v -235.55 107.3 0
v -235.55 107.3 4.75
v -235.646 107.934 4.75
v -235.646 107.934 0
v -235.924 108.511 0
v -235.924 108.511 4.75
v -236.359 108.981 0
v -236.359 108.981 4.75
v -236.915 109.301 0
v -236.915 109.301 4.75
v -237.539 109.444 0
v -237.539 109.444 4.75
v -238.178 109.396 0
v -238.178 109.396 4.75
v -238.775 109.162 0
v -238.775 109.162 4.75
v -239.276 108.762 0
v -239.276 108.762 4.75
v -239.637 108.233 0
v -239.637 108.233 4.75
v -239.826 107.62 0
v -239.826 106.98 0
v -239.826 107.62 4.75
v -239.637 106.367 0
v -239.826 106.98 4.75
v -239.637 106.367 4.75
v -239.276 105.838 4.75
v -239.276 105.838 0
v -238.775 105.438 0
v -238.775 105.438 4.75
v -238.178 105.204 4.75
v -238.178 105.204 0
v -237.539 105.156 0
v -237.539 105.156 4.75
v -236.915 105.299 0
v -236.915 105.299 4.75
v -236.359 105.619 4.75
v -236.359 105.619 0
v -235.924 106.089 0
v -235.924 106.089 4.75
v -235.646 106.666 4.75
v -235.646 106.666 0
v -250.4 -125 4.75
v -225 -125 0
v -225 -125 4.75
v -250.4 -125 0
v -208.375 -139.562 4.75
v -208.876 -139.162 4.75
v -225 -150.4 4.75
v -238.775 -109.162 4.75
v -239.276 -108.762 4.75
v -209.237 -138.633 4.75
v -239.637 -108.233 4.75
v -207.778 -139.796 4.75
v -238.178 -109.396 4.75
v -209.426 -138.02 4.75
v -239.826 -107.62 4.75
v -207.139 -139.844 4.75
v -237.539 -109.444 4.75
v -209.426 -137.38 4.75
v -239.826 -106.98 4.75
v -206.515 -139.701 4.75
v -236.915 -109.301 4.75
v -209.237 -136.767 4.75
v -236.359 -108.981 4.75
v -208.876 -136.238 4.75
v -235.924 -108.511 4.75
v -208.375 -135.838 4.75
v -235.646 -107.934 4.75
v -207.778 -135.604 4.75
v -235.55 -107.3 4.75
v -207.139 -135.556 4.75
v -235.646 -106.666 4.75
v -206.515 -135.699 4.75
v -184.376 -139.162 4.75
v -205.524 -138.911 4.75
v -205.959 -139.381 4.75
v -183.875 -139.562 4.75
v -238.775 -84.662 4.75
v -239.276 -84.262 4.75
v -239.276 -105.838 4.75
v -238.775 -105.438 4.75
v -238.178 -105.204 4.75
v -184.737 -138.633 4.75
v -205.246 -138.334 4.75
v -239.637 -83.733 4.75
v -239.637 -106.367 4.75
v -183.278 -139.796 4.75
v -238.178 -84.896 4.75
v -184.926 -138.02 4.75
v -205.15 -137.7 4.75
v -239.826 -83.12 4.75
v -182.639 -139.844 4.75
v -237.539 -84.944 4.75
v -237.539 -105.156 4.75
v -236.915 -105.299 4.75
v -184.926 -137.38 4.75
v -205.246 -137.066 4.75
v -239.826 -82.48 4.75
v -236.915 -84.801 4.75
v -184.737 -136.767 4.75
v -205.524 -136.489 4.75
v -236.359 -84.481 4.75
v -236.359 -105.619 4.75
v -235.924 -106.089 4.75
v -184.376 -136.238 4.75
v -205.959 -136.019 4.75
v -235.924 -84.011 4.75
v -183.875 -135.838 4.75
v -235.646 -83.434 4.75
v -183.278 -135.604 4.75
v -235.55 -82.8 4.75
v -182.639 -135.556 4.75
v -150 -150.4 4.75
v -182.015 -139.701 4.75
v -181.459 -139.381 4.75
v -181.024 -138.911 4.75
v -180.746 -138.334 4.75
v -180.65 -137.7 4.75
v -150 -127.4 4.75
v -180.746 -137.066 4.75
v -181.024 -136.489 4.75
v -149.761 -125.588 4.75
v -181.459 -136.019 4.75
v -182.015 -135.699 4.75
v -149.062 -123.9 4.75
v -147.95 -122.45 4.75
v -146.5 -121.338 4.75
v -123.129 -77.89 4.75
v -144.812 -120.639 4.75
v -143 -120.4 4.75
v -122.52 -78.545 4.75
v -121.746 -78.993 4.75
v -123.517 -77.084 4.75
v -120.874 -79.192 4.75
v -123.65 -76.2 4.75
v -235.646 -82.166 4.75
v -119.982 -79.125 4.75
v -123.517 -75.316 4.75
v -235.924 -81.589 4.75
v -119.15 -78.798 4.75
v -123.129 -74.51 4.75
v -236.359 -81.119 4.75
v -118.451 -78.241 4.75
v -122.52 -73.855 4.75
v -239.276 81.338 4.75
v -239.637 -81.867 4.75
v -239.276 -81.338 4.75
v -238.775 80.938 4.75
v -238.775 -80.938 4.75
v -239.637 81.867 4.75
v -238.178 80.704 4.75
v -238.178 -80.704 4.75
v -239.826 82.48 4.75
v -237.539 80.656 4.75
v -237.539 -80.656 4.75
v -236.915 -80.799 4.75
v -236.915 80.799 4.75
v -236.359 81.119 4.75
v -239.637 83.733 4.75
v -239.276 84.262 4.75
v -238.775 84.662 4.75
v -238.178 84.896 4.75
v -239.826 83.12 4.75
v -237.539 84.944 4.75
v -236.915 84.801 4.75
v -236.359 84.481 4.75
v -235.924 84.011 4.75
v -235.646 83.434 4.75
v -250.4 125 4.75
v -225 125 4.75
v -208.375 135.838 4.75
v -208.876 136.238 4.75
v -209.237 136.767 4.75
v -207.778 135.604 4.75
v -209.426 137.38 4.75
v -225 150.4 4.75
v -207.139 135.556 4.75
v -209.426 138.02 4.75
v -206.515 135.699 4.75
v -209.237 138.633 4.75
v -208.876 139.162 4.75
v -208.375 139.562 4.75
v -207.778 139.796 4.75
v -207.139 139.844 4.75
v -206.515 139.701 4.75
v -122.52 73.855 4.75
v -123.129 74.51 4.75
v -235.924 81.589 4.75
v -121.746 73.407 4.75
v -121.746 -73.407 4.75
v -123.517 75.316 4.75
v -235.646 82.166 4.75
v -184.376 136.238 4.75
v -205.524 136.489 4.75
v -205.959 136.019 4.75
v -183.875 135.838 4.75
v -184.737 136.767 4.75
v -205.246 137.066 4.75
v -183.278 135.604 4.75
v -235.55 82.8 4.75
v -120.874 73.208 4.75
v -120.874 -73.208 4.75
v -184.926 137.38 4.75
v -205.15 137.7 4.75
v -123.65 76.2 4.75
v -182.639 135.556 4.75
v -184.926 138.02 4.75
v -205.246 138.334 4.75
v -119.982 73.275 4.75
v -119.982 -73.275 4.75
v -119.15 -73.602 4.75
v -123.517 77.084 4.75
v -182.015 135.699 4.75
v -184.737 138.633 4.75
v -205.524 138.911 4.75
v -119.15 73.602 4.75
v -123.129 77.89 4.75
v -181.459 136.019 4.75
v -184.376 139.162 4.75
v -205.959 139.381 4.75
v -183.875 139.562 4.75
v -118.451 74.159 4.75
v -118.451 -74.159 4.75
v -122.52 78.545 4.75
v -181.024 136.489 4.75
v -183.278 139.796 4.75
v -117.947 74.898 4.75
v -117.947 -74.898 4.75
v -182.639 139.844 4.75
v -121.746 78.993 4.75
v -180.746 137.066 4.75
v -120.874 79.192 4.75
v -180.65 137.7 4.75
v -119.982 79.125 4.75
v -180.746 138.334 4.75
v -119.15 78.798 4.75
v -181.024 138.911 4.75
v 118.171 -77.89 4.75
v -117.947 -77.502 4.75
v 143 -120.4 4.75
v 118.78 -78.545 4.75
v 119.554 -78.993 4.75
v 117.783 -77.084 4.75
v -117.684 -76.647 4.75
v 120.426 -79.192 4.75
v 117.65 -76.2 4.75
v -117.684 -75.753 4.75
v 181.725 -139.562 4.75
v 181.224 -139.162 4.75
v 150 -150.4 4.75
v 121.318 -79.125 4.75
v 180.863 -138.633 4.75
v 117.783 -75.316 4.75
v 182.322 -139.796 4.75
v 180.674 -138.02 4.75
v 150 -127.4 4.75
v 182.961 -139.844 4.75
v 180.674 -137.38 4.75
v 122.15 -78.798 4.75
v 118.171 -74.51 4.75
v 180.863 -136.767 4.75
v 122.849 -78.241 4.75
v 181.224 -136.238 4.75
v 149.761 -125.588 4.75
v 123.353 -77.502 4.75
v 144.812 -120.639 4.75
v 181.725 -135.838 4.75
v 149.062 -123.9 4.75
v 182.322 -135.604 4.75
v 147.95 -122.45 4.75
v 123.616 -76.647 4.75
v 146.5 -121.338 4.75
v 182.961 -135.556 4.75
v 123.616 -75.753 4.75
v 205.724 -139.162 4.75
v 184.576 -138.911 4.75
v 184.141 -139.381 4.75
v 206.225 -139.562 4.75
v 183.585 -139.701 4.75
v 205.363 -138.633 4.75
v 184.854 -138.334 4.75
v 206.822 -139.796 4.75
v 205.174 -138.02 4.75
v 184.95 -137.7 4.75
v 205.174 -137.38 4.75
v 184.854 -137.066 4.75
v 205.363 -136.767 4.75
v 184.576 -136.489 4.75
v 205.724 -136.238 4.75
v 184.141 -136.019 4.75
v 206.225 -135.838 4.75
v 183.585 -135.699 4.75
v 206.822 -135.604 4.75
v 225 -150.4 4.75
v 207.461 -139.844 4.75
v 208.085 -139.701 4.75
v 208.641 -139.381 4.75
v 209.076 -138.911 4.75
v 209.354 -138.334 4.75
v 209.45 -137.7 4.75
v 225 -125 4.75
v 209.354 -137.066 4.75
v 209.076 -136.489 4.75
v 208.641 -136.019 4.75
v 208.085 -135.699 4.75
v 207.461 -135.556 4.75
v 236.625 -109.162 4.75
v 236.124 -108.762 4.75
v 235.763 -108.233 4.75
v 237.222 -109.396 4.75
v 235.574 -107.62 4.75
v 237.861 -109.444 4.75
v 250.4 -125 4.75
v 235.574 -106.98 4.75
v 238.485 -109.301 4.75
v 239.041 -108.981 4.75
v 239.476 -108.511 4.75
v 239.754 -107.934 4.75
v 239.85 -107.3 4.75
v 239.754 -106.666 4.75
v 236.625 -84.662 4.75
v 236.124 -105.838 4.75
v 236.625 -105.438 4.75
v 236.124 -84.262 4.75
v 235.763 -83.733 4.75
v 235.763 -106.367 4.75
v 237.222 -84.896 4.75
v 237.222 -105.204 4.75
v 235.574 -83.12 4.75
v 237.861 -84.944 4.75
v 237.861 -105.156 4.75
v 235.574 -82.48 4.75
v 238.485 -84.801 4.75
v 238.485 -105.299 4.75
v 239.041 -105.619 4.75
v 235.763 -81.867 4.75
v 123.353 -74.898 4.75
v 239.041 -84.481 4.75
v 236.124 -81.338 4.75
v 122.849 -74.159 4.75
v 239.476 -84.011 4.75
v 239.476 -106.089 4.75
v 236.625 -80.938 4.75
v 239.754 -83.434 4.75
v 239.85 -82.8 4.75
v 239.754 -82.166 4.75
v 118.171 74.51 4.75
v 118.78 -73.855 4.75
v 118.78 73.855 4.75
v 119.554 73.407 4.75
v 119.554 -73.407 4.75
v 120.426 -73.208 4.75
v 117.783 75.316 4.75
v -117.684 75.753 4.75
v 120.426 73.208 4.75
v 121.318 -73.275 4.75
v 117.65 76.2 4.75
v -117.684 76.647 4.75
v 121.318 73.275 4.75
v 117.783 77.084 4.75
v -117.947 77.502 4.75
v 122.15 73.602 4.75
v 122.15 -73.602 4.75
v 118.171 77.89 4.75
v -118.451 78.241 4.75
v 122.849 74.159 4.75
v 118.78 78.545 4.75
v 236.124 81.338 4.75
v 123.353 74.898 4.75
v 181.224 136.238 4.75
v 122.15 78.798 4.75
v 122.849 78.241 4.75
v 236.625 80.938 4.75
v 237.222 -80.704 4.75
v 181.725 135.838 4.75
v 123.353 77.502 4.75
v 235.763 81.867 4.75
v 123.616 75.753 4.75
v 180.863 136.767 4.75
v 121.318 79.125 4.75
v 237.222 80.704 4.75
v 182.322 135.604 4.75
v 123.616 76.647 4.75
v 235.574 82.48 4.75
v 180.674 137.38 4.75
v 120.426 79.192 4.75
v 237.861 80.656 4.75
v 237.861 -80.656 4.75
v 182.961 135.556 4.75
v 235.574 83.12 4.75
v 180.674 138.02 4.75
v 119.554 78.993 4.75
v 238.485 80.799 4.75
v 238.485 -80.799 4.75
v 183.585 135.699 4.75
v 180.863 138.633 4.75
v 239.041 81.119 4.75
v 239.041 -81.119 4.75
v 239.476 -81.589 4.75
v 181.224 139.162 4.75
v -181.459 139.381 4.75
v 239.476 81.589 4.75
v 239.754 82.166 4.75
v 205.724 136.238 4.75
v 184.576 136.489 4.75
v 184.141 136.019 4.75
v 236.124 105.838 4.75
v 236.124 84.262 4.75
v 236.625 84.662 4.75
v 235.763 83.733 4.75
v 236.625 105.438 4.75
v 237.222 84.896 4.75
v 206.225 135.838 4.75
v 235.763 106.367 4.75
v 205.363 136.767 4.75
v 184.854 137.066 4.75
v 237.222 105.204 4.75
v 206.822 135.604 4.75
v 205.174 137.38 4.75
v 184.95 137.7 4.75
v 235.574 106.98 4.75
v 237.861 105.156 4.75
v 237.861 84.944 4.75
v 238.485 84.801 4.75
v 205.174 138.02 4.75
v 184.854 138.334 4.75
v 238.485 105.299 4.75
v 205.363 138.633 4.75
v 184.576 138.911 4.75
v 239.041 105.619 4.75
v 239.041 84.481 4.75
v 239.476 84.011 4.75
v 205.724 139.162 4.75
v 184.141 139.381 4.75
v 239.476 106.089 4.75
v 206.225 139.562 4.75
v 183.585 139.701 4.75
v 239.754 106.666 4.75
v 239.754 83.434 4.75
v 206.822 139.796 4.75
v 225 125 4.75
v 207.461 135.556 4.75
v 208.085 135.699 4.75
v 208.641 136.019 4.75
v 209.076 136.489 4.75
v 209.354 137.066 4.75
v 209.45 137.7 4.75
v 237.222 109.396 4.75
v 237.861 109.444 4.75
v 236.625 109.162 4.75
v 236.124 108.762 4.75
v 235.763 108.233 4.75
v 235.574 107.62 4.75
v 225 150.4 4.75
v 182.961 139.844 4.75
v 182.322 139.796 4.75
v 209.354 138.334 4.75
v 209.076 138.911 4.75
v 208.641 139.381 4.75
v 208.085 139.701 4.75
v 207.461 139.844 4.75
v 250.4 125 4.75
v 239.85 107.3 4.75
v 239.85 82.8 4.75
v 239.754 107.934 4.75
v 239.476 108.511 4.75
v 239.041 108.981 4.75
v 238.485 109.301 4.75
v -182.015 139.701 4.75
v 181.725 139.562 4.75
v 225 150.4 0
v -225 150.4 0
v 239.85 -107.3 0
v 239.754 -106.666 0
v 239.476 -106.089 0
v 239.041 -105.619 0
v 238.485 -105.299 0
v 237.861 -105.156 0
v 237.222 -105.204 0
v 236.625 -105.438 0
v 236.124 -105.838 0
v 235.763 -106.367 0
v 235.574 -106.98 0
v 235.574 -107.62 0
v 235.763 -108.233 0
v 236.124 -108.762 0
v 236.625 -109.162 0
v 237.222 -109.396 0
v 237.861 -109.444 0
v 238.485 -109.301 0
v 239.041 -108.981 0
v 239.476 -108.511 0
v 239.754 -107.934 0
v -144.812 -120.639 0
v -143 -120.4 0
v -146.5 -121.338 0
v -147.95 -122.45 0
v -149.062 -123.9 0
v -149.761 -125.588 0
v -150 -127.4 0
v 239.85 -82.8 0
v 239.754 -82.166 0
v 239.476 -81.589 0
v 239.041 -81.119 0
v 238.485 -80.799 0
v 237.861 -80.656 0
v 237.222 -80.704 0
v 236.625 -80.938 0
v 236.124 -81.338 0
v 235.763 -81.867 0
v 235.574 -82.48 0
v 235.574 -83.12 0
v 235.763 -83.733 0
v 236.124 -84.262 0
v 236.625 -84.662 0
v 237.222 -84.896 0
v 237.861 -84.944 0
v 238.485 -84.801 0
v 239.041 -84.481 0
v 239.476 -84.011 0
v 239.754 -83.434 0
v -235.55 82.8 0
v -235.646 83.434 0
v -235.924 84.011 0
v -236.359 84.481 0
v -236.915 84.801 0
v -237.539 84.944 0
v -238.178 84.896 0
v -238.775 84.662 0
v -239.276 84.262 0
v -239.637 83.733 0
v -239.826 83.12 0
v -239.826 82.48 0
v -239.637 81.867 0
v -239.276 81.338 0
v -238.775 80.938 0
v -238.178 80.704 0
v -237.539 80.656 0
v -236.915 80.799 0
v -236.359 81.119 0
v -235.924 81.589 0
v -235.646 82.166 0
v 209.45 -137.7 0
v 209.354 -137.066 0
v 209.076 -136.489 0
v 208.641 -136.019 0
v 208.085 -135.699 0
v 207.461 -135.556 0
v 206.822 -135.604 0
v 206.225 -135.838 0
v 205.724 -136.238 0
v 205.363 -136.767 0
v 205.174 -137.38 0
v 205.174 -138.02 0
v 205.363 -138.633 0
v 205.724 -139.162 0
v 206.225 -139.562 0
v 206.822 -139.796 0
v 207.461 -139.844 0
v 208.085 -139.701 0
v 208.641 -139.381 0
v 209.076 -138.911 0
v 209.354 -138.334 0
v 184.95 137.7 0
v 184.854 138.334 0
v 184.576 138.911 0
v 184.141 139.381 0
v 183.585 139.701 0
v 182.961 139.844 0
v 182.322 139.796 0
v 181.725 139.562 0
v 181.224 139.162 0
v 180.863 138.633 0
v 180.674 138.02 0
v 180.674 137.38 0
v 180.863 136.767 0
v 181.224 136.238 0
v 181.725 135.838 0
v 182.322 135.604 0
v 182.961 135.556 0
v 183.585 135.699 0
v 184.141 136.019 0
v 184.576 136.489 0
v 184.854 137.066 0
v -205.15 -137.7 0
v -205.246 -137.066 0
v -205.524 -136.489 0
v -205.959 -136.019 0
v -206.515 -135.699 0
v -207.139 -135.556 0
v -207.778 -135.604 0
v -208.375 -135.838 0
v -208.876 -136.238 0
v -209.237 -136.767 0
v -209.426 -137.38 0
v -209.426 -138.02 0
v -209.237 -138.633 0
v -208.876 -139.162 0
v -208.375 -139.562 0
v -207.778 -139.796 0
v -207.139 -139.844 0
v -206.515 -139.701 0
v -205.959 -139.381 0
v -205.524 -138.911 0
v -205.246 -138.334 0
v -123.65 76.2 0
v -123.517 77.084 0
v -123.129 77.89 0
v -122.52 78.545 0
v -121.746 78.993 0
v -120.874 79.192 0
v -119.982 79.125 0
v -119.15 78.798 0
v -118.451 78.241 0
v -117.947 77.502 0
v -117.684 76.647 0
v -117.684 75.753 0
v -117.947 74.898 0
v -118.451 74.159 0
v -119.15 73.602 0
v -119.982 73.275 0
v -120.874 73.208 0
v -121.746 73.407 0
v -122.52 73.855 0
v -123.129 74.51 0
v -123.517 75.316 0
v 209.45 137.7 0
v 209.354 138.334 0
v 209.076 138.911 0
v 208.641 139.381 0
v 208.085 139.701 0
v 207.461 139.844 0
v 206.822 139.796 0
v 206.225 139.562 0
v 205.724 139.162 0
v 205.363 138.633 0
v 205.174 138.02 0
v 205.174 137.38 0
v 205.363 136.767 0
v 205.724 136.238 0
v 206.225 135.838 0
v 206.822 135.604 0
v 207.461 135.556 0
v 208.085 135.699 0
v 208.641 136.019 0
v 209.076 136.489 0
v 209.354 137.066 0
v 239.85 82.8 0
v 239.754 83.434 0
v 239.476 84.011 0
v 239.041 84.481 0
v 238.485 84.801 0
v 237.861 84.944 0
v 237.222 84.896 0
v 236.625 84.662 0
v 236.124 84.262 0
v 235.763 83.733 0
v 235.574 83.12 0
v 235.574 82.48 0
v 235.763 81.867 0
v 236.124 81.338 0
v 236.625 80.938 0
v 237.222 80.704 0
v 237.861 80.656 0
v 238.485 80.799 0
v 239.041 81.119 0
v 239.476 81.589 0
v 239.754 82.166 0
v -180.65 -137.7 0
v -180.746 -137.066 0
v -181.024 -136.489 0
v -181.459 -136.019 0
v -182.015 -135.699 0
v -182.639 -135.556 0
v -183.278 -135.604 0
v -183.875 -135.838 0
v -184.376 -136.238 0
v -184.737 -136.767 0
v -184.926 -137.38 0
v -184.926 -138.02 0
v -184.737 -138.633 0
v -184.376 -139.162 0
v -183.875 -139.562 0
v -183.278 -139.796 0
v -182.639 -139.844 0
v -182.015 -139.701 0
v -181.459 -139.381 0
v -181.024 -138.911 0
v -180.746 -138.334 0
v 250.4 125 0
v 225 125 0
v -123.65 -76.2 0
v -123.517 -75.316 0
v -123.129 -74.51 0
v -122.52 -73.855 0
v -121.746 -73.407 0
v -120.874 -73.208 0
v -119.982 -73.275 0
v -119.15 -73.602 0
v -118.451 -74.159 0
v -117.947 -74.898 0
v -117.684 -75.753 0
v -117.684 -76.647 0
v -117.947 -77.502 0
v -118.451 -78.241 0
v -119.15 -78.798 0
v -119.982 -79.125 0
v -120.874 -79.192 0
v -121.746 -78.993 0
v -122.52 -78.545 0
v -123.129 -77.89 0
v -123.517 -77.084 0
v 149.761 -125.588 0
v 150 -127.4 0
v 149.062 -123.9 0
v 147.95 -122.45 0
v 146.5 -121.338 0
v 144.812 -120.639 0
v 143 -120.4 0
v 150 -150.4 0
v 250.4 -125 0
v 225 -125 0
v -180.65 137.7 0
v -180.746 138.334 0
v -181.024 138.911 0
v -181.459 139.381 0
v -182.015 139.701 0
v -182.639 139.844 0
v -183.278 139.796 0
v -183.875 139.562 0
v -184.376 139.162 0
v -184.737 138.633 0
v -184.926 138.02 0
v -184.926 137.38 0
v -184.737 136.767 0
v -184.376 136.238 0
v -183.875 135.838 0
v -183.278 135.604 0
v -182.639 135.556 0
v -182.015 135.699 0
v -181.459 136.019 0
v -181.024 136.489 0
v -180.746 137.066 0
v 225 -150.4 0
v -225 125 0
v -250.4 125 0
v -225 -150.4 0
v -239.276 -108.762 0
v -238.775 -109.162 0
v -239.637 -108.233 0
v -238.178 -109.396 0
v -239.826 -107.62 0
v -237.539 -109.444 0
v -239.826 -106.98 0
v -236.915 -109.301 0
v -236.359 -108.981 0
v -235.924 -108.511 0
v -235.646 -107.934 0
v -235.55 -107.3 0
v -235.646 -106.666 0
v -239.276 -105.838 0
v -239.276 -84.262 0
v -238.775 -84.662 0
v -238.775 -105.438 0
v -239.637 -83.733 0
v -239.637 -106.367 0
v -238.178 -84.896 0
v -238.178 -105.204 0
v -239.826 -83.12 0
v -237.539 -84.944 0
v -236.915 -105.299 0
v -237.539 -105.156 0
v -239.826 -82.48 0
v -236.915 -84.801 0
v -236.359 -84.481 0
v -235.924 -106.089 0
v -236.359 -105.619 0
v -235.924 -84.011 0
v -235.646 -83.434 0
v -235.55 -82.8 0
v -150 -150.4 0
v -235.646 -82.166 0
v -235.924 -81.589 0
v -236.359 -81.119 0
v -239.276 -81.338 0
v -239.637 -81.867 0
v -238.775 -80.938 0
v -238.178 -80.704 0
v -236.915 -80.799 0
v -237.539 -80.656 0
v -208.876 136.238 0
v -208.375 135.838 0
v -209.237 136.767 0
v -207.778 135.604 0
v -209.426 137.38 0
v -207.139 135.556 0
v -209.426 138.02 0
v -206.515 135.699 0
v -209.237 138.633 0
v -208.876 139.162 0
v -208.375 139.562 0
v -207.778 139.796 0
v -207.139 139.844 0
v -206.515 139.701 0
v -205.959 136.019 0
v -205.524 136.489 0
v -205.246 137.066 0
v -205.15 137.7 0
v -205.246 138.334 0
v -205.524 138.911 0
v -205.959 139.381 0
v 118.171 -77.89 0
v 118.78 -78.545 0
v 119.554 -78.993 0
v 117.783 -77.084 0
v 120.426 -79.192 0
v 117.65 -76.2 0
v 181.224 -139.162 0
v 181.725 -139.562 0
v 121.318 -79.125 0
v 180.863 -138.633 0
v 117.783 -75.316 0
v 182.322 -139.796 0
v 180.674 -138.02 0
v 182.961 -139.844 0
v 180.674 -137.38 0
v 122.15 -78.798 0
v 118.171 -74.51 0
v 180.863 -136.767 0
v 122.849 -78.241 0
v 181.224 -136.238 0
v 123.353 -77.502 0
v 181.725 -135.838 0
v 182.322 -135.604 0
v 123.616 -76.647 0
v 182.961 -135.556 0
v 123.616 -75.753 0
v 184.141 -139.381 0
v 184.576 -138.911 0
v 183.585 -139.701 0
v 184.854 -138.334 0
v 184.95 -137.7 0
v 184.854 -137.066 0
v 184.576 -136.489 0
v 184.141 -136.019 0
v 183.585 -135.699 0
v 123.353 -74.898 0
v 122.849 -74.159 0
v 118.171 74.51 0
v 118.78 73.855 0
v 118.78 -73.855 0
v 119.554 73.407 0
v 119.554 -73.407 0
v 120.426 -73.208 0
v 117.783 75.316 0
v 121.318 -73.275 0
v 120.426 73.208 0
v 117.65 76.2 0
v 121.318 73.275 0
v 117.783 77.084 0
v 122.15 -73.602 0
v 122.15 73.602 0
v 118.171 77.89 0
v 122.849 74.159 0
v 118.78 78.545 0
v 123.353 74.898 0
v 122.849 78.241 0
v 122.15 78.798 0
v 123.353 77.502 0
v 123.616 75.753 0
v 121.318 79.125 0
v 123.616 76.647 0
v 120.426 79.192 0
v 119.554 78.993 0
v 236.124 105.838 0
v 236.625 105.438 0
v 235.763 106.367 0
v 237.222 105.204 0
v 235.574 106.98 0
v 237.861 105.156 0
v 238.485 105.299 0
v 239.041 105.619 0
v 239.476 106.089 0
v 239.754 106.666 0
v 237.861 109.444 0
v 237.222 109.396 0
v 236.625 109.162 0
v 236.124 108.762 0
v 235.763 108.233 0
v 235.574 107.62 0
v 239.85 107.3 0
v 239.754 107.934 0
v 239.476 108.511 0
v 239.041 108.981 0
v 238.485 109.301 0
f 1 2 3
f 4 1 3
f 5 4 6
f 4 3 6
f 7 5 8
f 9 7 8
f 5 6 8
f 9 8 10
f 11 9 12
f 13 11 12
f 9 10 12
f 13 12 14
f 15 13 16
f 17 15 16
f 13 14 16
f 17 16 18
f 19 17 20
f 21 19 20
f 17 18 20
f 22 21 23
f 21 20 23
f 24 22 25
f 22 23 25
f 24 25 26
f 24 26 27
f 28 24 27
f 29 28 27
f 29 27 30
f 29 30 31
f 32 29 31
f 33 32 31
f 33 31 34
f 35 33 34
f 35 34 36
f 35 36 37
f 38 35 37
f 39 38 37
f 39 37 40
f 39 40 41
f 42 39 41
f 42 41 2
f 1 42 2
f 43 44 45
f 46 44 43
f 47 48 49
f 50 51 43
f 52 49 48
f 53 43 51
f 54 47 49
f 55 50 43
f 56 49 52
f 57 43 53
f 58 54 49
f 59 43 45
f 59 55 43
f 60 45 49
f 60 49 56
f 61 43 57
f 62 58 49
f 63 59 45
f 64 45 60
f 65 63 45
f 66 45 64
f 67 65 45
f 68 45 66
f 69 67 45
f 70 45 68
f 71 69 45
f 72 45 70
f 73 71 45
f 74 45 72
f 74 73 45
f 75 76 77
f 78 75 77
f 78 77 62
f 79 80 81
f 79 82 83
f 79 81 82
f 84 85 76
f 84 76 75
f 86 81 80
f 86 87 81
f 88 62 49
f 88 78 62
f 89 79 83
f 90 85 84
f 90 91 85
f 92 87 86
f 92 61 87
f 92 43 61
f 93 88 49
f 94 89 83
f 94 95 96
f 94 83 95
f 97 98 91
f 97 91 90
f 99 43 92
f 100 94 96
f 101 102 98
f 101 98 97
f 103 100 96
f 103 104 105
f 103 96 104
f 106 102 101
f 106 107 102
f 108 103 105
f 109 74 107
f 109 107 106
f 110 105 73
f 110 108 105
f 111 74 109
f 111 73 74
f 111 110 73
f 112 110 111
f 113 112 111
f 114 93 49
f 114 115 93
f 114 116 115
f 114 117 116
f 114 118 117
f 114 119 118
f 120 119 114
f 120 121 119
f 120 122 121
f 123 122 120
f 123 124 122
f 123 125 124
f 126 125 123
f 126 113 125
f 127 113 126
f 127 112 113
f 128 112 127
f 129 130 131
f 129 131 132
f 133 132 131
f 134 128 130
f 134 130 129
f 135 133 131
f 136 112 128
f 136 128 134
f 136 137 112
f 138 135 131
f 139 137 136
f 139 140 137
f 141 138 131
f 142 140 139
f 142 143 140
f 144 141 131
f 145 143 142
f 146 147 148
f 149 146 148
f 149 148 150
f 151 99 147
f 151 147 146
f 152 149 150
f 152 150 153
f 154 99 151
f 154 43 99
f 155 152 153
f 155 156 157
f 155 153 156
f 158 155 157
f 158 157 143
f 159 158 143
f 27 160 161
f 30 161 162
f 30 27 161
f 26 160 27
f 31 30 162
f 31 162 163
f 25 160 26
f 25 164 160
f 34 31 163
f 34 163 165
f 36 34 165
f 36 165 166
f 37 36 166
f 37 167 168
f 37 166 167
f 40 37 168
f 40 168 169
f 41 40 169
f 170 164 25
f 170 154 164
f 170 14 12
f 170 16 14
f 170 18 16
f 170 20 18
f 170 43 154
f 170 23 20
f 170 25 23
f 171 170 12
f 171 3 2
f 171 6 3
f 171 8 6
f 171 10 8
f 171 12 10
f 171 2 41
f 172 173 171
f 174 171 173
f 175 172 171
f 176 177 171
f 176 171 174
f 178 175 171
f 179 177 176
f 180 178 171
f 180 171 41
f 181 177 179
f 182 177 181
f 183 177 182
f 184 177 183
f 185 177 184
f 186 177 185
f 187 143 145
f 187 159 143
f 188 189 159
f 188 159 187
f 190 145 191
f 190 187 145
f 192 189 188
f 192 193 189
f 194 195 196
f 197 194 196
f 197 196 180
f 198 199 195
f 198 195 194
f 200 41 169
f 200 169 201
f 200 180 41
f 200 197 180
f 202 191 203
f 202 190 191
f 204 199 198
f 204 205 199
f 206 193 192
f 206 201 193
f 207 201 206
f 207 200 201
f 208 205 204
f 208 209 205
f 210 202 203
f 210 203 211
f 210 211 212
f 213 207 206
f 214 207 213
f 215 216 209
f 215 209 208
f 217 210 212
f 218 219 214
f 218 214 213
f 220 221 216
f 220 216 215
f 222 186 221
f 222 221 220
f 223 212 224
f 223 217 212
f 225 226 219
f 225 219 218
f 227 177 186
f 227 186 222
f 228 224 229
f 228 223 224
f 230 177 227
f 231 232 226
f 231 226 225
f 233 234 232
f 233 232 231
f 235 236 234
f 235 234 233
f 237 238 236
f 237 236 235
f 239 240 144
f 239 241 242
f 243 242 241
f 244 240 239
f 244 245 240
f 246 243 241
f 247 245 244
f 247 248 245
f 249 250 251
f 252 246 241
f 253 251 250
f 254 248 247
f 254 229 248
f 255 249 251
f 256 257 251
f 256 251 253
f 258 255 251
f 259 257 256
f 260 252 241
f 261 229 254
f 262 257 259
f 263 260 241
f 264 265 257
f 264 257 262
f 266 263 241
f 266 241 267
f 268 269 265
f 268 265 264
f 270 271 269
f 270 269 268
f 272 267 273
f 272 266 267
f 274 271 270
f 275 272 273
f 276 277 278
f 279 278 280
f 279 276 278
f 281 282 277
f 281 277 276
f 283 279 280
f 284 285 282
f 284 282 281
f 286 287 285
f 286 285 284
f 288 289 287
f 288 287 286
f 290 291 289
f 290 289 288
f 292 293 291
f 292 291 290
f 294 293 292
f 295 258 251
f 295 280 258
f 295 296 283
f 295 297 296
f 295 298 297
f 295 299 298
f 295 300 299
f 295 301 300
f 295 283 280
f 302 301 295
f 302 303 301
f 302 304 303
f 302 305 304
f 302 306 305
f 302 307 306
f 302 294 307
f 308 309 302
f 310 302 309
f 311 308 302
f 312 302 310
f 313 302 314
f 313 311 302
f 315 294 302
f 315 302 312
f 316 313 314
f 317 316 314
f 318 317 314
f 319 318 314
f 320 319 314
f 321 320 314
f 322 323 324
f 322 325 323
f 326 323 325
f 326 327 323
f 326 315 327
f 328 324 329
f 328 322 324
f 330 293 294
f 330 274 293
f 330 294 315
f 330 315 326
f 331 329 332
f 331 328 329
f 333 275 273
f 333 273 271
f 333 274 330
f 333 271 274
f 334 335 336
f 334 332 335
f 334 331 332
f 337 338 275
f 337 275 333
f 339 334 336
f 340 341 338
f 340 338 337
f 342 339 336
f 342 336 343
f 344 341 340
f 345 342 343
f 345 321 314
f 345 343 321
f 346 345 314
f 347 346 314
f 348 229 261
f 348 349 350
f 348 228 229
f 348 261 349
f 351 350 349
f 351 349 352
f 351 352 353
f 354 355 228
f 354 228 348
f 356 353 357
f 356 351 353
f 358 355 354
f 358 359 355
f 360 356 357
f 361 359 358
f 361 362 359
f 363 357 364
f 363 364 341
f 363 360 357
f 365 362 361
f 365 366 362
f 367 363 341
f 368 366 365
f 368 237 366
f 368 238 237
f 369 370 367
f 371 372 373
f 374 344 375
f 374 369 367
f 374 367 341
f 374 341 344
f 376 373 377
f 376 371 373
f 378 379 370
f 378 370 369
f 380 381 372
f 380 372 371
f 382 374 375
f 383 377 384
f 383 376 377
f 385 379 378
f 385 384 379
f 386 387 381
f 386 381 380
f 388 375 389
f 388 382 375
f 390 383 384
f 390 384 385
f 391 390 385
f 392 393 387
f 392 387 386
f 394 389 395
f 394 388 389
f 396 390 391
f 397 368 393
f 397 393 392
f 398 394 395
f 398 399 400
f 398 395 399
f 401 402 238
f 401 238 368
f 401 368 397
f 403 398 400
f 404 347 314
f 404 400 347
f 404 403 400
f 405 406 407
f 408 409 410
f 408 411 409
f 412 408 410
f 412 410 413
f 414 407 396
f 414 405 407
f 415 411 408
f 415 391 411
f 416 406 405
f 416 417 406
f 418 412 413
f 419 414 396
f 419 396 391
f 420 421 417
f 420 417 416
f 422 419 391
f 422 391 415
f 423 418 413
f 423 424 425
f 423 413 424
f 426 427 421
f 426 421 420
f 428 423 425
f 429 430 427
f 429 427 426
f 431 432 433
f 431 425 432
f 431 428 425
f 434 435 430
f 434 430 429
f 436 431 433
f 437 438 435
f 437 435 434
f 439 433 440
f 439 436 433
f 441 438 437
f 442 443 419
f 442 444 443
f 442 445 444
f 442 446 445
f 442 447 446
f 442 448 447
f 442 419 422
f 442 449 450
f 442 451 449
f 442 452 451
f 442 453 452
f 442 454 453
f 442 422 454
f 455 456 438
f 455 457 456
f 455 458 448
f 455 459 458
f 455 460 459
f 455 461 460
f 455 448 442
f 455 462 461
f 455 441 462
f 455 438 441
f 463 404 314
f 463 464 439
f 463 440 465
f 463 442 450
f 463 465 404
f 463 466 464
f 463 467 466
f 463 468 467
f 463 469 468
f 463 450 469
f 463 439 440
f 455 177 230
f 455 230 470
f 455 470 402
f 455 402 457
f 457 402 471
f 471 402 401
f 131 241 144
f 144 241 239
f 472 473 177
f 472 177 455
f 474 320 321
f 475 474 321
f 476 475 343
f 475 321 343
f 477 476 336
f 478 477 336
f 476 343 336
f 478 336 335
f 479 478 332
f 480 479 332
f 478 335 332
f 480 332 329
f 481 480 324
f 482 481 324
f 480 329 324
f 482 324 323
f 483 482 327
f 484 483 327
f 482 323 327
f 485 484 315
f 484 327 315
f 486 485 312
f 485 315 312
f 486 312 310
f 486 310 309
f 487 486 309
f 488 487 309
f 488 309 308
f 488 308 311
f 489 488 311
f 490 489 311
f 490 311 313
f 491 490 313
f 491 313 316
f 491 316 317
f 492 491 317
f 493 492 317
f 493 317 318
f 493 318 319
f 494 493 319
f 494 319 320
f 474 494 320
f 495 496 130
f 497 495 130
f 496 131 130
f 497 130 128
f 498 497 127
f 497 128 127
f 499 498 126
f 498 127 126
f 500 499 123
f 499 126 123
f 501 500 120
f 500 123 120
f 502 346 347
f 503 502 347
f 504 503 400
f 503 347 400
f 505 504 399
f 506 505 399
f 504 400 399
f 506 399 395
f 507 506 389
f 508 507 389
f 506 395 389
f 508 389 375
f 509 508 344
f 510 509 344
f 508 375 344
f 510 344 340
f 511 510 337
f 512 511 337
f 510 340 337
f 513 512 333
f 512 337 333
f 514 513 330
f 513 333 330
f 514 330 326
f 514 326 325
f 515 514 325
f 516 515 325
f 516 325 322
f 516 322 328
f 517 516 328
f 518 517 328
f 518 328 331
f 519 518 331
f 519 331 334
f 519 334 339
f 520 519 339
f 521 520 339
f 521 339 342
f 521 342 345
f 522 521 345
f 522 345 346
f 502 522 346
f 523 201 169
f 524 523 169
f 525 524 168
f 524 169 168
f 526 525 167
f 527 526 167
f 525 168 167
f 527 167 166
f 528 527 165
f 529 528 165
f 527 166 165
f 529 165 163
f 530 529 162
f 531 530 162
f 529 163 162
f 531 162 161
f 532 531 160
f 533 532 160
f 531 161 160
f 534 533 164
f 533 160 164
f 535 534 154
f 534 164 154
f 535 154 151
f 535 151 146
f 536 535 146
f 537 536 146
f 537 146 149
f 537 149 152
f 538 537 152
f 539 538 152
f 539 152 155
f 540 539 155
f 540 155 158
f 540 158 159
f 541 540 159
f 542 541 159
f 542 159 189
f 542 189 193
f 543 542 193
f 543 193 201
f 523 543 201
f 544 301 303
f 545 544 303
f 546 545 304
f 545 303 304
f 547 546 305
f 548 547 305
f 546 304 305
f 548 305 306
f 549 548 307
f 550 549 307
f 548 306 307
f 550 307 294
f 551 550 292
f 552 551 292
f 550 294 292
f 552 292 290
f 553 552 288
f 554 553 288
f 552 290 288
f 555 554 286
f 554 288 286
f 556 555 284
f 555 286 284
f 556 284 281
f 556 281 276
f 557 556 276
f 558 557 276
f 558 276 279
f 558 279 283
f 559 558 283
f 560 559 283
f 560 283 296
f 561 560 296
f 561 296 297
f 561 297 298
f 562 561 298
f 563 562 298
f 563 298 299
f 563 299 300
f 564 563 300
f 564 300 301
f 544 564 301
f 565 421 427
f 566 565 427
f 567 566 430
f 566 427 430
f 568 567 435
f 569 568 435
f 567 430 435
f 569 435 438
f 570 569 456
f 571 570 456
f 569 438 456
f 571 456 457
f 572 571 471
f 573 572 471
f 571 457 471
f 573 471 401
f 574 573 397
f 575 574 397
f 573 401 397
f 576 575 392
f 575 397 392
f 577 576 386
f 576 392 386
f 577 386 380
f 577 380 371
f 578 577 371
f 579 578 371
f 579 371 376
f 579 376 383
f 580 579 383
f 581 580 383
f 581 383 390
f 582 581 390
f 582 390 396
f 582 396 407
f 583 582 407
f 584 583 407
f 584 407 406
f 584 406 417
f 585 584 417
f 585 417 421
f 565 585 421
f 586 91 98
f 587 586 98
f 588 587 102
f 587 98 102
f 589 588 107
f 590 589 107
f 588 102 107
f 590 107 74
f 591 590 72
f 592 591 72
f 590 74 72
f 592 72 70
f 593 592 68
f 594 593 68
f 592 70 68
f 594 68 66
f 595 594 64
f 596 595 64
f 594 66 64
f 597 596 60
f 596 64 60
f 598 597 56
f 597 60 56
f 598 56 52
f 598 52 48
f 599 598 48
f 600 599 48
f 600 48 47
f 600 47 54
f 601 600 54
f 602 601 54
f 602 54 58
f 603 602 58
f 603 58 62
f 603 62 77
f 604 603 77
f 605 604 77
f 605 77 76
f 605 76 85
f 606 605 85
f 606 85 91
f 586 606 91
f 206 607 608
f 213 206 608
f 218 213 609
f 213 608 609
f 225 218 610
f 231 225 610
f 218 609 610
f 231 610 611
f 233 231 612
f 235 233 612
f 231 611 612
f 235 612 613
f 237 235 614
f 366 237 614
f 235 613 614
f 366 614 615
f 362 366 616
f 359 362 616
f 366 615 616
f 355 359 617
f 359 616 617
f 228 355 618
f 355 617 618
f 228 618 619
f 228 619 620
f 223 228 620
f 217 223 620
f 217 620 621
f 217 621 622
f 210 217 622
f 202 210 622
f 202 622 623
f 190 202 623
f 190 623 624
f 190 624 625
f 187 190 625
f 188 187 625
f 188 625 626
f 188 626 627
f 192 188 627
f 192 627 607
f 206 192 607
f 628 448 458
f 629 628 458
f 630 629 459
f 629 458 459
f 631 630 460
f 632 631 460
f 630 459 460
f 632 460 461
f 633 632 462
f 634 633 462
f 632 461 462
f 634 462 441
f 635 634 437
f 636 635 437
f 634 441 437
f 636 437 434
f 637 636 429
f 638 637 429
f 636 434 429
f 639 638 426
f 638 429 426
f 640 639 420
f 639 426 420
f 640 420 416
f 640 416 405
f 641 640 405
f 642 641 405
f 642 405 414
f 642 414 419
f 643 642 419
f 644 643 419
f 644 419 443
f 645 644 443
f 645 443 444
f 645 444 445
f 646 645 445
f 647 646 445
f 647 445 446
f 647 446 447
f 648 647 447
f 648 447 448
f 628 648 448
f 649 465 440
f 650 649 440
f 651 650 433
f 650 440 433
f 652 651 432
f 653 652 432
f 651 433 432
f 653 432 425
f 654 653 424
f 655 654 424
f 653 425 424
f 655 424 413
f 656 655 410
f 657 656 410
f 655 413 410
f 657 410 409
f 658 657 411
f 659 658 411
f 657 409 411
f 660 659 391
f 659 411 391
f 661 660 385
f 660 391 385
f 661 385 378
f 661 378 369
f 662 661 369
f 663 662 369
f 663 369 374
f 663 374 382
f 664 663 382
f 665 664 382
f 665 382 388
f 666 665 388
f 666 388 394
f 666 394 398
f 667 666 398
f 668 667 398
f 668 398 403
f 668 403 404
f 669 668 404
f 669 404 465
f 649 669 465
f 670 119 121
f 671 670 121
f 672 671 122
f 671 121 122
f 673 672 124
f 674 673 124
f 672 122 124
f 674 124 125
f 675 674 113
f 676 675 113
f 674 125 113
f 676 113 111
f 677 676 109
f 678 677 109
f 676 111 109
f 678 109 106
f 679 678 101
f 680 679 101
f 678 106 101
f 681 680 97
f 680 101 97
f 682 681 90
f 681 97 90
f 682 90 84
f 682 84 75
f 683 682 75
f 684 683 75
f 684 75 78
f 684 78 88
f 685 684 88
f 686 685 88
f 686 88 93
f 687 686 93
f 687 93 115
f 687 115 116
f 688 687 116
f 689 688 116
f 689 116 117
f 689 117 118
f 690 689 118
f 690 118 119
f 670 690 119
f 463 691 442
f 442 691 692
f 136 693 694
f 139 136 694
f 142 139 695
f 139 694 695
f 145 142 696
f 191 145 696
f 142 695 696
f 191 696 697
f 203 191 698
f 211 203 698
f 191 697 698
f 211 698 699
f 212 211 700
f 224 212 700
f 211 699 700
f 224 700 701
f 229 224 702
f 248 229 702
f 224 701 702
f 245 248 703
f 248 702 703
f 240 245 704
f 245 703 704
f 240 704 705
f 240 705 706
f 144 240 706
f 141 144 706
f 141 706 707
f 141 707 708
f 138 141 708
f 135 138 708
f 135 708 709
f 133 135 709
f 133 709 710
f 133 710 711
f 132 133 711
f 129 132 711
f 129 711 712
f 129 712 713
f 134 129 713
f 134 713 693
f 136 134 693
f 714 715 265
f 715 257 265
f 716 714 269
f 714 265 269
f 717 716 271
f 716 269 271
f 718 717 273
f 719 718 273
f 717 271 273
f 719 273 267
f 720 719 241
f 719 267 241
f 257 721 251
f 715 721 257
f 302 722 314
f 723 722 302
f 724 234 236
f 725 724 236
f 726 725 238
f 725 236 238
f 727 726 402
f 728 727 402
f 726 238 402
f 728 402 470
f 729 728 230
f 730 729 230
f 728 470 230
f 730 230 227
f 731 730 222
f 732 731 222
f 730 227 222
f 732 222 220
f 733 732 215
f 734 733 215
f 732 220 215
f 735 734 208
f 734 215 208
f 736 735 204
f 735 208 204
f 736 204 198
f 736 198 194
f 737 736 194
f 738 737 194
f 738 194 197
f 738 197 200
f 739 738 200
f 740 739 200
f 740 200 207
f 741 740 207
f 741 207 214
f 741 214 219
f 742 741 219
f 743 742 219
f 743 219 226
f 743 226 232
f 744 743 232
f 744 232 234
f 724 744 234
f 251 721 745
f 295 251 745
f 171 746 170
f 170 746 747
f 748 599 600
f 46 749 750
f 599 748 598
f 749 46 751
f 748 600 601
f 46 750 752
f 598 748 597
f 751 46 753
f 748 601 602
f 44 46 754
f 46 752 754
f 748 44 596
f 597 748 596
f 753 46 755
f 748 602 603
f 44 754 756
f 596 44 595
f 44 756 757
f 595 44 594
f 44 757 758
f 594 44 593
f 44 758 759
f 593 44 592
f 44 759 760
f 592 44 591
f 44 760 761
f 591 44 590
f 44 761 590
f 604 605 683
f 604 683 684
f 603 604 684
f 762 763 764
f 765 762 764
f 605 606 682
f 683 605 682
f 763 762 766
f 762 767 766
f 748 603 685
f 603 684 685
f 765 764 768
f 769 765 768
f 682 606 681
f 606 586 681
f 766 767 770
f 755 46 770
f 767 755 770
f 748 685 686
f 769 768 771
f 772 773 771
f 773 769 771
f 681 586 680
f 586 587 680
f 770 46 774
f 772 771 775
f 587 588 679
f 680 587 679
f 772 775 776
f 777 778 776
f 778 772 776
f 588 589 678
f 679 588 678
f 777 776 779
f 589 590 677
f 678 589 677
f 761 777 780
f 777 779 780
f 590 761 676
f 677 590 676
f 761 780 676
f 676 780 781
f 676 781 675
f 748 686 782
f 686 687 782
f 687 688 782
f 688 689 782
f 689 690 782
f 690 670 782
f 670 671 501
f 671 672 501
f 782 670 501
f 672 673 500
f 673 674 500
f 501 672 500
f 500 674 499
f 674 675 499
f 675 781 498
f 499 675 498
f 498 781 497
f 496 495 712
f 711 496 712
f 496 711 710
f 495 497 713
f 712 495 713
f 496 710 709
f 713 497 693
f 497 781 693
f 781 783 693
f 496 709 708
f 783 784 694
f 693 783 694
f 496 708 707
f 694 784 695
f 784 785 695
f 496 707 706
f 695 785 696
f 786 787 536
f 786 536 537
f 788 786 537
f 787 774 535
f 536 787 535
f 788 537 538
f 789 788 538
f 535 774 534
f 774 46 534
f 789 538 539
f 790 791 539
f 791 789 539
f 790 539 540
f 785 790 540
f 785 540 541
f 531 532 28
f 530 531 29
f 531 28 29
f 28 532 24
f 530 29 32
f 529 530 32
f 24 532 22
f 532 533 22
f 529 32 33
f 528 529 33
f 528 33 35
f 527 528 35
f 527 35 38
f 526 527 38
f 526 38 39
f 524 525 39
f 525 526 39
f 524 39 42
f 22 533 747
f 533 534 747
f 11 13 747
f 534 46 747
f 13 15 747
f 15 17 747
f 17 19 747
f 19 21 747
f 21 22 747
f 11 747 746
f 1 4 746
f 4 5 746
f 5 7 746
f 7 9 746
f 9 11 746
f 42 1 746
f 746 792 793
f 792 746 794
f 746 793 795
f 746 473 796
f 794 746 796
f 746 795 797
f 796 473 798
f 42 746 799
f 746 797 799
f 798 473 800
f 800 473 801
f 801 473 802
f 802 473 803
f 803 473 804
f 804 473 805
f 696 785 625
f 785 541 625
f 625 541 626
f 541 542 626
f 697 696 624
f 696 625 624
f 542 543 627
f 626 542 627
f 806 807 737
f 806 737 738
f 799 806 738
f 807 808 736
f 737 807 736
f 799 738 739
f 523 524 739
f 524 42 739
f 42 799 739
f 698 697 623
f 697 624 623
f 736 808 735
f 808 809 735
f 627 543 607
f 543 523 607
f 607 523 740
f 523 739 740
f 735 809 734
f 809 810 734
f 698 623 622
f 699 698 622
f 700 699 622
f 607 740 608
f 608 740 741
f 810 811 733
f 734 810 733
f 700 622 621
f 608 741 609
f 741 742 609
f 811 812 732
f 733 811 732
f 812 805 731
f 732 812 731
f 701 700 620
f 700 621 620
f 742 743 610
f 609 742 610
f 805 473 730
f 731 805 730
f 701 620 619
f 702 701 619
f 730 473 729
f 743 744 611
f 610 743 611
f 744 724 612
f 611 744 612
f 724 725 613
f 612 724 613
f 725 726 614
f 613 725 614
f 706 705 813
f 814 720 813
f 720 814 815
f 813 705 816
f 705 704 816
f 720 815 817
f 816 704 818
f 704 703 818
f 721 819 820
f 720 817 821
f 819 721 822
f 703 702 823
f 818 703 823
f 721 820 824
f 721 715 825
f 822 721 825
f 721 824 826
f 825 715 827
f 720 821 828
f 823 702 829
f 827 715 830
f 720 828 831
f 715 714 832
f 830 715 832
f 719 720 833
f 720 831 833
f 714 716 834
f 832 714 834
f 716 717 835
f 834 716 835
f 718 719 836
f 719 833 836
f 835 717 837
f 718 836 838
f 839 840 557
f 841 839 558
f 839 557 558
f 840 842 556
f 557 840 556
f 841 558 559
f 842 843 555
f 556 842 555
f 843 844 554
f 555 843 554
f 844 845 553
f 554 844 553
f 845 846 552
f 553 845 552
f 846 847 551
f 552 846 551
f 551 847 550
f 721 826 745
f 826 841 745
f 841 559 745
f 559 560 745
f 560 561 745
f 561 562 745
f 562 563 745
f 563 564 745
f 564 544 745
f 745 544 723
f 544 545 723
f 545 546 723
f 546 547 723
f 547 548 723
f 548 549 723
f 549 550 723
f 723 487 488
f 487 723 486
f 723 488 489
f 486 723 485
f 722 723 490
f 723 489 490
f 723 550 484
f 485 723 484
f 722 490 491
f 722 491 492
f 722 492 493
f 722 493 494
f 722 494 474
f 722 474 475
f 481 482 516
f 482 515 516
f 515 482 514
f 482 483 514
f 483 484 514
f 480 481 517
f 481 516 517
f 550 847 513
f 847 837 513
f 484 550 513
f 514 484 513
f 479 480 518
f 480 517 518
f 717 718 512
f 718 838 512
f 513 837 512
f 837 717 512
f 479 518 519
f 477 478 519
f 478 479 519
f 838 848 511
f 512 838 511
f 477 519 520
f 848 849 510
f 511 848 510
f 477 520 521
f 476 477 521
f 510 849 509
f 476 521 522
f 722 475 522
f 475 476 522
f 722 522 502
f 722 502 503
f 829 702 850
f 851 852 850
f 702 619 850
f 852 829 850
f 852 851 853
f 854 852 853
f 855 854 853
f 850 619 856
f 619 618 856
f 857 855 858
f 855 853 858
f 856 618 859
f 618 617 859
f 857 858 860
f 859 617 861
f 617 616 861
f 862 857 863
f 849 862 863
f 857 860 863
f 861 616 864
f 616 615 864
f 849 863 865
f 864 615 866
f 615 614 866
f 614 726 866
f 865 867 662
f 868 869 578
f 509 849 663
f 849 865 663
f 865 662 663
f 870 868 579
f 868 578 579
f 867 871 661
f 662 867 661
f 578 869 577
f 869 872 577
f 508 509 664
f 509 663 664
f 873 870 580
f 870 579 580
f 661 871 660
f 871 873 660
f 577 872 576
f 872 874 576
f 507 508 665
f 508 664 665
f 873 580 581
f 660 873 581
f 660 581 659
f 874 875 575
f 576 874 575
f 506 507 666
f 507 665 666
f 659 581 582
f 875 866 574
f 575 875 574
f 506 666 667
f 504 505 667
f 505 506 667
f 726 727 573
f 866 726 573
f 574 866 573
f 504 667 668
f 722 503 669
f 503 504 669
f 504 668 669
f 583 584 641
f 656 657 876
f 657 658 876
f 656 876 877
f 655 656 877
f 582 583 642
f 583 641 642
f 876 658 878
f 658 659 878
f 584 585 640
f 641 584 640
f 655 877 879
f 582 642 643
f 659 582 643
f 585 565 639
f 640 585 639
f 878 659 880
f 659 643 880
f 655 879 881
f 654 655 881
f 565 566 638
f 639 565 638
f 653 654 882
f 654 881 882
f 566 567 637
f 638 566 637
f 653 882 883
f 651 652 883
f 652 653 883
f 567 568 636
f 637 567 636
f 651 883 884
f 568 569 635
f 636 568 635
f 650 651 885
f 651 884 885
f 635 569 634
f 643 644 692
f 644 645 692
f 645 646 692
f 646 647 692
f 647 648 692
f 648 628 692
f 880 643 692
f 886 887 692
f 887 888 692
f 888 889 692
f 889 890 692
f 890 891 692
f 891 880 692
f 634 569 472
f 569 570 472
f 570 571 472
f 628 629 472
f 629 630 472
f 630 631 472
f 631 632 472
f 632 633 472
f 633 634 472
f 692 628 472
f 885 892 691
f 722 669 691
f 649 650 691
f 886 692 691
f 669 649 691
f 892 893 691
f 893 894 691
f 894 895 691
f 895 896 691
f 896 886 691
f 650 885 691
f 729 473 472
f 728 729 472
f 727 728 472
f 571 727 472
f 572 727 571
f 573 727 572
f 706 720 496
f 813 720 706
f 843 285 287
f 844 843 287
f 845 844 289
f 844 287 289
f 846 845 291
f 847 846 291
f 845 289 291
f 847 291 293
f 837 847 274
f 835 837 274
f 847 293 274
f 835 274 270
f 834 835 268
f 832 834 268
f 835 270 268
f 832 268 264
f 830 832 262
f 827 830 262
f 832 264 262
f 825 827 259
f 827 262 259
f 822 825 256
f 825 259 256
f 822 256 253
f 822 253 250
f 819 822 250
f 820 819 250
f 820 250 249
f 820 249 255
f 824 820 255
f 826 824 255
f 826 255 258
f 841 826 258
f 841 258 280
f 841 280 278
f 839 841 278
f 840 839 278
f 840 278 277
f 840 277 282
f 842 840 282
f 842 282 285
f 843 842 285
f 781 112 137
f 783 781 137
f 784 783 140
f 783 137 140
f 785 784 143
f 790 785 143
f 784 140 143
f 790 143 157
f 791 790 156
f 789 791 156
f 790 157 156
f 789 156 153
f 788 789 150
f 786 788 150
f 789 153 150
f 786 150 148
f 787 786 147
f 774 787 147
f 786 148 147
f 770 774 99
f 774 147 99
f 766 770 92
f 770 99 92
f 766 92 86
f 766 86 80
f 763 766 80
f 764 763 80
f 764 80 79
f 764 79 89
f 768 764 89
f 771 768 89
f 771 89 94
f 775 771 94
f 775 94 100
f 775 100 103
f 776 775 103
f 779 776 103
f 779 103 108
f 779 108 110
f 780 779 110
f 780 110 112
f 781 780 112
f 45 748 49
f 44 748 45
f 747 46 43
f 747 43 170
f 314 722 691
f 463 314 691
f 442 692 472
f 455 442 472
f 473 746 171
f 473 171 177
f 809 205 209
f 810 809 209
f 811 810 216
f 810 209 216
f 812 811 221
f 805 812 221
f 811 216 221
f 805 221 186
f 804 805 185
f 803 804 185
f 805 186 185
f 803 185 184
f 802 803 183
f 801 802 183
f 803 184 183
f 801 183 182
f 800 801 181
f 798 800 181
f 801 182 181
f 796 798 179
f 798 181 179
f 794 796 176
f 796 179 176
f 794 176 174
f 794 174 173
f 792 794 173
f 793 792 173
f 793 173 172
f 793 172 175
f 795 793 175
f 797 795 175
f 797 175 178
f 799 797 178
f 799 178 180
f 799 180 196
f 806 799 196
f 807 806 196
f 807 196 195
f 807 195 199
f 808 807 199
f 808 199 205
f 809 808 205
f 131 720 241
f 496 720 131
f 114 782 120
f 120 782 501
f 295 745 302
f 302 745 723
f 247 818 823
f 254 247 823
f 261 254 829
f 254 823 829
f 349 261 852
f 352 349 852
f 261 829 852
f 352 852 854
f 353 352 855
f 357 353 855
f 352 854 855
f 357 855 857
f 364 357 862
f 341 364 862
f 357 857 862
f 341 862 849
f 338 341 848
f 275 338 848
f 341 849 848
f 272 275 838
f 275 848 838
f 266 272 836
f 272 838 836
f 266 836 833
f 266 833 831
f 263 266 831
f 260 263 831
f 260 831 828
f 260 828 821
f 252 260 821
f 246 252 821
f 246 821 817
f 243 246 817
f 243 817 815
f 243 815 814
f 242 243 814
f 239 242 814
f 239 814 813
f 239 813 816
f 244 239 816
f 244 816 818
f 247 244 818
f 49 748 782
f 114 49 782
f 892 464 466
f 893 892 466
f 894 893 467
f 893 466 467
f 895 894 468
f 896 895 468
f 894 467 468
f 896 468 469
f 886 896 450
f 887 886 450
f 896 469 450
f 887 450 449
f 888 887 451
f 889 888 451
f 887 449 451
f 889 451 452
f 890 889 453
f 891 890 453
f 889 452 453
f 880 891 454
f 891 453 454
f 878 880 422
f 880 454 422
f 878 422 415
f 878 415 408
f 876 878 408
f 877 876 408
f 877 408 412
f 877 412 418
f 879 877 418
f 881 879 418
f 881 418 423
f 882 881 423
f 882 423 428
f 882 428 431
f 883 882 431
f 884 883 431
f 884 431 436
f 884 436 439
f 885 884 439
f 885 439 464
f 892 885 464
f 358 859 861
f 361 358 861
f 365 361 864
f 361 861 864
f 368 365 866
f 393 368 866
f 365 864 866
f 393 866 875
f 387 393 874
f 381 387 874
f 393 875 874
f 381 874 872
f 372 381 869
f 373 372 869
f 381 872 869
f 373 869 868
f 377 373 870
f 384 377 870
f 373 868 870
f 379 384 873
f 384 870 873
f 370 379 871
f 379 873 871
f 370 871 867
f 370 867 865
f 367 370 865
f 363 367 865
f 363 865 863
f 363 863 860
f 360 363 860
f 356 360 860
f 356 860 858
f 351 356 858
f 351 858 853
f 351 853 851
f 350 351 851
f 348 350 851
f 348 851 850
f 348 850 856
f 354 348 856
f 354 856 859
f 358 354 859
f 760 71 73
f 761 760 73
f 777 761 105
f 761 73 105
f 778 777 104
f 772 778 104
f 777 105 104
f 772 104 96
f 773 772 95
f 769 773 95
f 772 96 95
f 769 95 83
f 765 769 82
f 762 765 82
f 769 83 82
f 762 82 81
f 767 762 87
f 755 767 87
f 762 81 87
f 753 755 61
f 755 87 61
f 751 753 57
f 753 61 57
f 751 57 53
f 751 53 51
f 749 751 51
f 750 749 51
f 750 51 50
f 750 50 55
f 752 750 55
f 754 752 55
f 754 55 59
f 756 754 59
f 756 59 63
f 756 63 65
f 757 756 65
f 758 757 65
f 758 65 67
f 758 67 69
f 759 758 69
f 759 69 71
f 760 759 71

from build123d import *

# Parameters (mm, degrees)
SKETCH_1_W          = 500.8
SKETCH_1_H          = 300.8
EXTRUDE_1_DEPTH     = 4.75
SKETCH_2_R          = 3
SKETCH_2_W          = 25.4
SKETCH_2_H          = 25.4
CUT_EXTRUDE_1_DEPTH = 10
SKETCH_3_R          = 2.15
CUT_EXTRUDE_2_DEPTH = 5
SKETCH_4_R          = 2.15
CUT_EXTRUDE_3_DEPTH = 5
SKETCH_5_R          = 2.15
SKETCH_5_R_2        = 2.150000001
CUT_EXTRUDE_4_DEPTH = 5
SKETCH_7_R          = 2.15
SKETCH_7_R_2        = 2.150000004
CUT_EXTRUDE_6_DEPTH = 5
SKETCH_8_W          = 300
SKETCH_8_H          = 30
CUT_EXTRUDE_7_DEPTH = 10
FILLET_2_R          = 7


with BuildPart() as part:
    # 草圖1 → 填料-伸長1 (new body)
    with BuildSketch(Plane.XY):
        Rectangle(SKETCH_1_W, SKETCH_1_H)
    extrude(amount=EXTRUDE_1_DEPTH)

    # 草圖2 → 除料-伸長1 (cut)
    with BuildSketch(Plane(origin=(0, 0, 0), x_dir=(-1, 0, 0), z_dir=(0, 0, -1))):
        with Locations((-120.65, 76.2)):
            Circle(SKETCH_2_R)
        with Locations((-120.65, -76.2)):
            Circle(SKETCH_2_R)
        with Locations((120.65, -76.2)):
            Circle(SKETCH_2_R)
        with Locations((120.65, 76.2)):
            Circle(SKETCH_2_R)
        with Locations((-237.7, 137.7)):
            Rectangle(SKETCH_2_W, SKETCH_2_H)
        with Locations((-237.7, -137.7)):
            Rectangle(SKETCH_2_W, SKETCH_2_H)
        with Locations((237.7, 137.7)):
            Rectangle(SKETCH_2_W, SKETCH_2_H)
        with Locations((237.7, -137.7)):
            Rectangle(SKETCH_2_W, SKETCH_2_H)
    extrude(amount=-CUT_EXTRUDE_1_DEPTH, mode=Mode.SUBTRACT)

    # 草圖3 → 除料-伸長2 (cut)
    with BuildSketch(Plane.XY.offset(4.75)):
        with Locations((207.3, 137.7)):
            Circle(SKETCH_3_R)
        with Locations((182.8, 137.7)):
            Circle(SKETCH_3_R)
    extrude(amount=-CUT_EXTRUDE_2_DEPTH, mode=Mode.SUBTRACT)

    # 草圖4 → 除料-伸長3 (cut)
    with BuildSketch(Plane.XY.offset(4.75)):
        with Locations((237.7, 82.8)):
            Circle(SKETCH_4_R)
        with Locations((237.7, 107.3)):
            Circle(SKETCH_4_R)
    extrude(amount=-CUT_EXTRUDE_3_DEPTH, mode=Mode.SUBTRACT)

    # 草圖5 → 除料-伸長4 (cut)
    with BuildSketch(Plane.XY.offset(4.75)):
        with Locations((237.7, -107.300000014)):
            Circle(SKETCH_5_R)
        with Locations((237.7, -82.800000014)):
            Circle(SKETCH_5_R)
        with Locations((207.3, -137.7)):
            Circle(SKETCH_5_R_2)
        with Locations((182.8, -137.7)):
            Circle(SKETCH_5_R)
    extrude(amount=-CUT_EXTRUDE_4_DEPTH, mode=Mode.SUBTRACT)

    # 草圖7 → 除料-伸長6 (cut)
    with BuildSketch(Plane.XY.offset(4.75)):
        with Locations((-182.8, -137.7)):
            Circle(SKETCH_7_R)
        with Locations((-207.3, -137.7)):
            Circle(SKETCH_7_R)
        with Locations((-237.7, -107.3)):
            Circle(SKETCH_7_R)
        with Locations((-237.7, -82.8)):
            Circle(SKETCH_7_R)
        with Locations((-237.7, 82.800000014)):
            Circle(SKETCH_7_R_2)
        with Locations((-237.7, 107.300000014)):
            Circle(SKETCH_7_R_2)
        with Locations((-207.3, 137.7)):
            Circle(SKETCH_7_R)
        with Locations((-182.8, 137.7)):
            Circle(SKETCH_7_R)
    extrude(amount=-CUT_EXTRUDE_6_DEPTH, mode=Mode.SUBTRACT)

    # 草圖8 → 除料-伸長7 (cut)
    with BuildSketch(Plane(origin=(0, 0, 0), x_dir=(-1, 0, 0), z_dir=(0, 0, -1))):
        with Locations((0, -135.4)):
            Rectangle(SKETCH_8_W, SKETCH_8_H)
    extrude(amount=-CUT_EXTRUDE_7_DEPTH, mode=Mode.SUBTRACT)

    # 圓角2
    fillet_2_edges = [part.edges().sort_by_distance(p)[0] for p in [
        (150, -120.4, 2.375),
        (-150, -120.4, 2.375),
    ]]
    fillet(fillet_2_edges, radius=FILLET_2_R)


solid = part.part
